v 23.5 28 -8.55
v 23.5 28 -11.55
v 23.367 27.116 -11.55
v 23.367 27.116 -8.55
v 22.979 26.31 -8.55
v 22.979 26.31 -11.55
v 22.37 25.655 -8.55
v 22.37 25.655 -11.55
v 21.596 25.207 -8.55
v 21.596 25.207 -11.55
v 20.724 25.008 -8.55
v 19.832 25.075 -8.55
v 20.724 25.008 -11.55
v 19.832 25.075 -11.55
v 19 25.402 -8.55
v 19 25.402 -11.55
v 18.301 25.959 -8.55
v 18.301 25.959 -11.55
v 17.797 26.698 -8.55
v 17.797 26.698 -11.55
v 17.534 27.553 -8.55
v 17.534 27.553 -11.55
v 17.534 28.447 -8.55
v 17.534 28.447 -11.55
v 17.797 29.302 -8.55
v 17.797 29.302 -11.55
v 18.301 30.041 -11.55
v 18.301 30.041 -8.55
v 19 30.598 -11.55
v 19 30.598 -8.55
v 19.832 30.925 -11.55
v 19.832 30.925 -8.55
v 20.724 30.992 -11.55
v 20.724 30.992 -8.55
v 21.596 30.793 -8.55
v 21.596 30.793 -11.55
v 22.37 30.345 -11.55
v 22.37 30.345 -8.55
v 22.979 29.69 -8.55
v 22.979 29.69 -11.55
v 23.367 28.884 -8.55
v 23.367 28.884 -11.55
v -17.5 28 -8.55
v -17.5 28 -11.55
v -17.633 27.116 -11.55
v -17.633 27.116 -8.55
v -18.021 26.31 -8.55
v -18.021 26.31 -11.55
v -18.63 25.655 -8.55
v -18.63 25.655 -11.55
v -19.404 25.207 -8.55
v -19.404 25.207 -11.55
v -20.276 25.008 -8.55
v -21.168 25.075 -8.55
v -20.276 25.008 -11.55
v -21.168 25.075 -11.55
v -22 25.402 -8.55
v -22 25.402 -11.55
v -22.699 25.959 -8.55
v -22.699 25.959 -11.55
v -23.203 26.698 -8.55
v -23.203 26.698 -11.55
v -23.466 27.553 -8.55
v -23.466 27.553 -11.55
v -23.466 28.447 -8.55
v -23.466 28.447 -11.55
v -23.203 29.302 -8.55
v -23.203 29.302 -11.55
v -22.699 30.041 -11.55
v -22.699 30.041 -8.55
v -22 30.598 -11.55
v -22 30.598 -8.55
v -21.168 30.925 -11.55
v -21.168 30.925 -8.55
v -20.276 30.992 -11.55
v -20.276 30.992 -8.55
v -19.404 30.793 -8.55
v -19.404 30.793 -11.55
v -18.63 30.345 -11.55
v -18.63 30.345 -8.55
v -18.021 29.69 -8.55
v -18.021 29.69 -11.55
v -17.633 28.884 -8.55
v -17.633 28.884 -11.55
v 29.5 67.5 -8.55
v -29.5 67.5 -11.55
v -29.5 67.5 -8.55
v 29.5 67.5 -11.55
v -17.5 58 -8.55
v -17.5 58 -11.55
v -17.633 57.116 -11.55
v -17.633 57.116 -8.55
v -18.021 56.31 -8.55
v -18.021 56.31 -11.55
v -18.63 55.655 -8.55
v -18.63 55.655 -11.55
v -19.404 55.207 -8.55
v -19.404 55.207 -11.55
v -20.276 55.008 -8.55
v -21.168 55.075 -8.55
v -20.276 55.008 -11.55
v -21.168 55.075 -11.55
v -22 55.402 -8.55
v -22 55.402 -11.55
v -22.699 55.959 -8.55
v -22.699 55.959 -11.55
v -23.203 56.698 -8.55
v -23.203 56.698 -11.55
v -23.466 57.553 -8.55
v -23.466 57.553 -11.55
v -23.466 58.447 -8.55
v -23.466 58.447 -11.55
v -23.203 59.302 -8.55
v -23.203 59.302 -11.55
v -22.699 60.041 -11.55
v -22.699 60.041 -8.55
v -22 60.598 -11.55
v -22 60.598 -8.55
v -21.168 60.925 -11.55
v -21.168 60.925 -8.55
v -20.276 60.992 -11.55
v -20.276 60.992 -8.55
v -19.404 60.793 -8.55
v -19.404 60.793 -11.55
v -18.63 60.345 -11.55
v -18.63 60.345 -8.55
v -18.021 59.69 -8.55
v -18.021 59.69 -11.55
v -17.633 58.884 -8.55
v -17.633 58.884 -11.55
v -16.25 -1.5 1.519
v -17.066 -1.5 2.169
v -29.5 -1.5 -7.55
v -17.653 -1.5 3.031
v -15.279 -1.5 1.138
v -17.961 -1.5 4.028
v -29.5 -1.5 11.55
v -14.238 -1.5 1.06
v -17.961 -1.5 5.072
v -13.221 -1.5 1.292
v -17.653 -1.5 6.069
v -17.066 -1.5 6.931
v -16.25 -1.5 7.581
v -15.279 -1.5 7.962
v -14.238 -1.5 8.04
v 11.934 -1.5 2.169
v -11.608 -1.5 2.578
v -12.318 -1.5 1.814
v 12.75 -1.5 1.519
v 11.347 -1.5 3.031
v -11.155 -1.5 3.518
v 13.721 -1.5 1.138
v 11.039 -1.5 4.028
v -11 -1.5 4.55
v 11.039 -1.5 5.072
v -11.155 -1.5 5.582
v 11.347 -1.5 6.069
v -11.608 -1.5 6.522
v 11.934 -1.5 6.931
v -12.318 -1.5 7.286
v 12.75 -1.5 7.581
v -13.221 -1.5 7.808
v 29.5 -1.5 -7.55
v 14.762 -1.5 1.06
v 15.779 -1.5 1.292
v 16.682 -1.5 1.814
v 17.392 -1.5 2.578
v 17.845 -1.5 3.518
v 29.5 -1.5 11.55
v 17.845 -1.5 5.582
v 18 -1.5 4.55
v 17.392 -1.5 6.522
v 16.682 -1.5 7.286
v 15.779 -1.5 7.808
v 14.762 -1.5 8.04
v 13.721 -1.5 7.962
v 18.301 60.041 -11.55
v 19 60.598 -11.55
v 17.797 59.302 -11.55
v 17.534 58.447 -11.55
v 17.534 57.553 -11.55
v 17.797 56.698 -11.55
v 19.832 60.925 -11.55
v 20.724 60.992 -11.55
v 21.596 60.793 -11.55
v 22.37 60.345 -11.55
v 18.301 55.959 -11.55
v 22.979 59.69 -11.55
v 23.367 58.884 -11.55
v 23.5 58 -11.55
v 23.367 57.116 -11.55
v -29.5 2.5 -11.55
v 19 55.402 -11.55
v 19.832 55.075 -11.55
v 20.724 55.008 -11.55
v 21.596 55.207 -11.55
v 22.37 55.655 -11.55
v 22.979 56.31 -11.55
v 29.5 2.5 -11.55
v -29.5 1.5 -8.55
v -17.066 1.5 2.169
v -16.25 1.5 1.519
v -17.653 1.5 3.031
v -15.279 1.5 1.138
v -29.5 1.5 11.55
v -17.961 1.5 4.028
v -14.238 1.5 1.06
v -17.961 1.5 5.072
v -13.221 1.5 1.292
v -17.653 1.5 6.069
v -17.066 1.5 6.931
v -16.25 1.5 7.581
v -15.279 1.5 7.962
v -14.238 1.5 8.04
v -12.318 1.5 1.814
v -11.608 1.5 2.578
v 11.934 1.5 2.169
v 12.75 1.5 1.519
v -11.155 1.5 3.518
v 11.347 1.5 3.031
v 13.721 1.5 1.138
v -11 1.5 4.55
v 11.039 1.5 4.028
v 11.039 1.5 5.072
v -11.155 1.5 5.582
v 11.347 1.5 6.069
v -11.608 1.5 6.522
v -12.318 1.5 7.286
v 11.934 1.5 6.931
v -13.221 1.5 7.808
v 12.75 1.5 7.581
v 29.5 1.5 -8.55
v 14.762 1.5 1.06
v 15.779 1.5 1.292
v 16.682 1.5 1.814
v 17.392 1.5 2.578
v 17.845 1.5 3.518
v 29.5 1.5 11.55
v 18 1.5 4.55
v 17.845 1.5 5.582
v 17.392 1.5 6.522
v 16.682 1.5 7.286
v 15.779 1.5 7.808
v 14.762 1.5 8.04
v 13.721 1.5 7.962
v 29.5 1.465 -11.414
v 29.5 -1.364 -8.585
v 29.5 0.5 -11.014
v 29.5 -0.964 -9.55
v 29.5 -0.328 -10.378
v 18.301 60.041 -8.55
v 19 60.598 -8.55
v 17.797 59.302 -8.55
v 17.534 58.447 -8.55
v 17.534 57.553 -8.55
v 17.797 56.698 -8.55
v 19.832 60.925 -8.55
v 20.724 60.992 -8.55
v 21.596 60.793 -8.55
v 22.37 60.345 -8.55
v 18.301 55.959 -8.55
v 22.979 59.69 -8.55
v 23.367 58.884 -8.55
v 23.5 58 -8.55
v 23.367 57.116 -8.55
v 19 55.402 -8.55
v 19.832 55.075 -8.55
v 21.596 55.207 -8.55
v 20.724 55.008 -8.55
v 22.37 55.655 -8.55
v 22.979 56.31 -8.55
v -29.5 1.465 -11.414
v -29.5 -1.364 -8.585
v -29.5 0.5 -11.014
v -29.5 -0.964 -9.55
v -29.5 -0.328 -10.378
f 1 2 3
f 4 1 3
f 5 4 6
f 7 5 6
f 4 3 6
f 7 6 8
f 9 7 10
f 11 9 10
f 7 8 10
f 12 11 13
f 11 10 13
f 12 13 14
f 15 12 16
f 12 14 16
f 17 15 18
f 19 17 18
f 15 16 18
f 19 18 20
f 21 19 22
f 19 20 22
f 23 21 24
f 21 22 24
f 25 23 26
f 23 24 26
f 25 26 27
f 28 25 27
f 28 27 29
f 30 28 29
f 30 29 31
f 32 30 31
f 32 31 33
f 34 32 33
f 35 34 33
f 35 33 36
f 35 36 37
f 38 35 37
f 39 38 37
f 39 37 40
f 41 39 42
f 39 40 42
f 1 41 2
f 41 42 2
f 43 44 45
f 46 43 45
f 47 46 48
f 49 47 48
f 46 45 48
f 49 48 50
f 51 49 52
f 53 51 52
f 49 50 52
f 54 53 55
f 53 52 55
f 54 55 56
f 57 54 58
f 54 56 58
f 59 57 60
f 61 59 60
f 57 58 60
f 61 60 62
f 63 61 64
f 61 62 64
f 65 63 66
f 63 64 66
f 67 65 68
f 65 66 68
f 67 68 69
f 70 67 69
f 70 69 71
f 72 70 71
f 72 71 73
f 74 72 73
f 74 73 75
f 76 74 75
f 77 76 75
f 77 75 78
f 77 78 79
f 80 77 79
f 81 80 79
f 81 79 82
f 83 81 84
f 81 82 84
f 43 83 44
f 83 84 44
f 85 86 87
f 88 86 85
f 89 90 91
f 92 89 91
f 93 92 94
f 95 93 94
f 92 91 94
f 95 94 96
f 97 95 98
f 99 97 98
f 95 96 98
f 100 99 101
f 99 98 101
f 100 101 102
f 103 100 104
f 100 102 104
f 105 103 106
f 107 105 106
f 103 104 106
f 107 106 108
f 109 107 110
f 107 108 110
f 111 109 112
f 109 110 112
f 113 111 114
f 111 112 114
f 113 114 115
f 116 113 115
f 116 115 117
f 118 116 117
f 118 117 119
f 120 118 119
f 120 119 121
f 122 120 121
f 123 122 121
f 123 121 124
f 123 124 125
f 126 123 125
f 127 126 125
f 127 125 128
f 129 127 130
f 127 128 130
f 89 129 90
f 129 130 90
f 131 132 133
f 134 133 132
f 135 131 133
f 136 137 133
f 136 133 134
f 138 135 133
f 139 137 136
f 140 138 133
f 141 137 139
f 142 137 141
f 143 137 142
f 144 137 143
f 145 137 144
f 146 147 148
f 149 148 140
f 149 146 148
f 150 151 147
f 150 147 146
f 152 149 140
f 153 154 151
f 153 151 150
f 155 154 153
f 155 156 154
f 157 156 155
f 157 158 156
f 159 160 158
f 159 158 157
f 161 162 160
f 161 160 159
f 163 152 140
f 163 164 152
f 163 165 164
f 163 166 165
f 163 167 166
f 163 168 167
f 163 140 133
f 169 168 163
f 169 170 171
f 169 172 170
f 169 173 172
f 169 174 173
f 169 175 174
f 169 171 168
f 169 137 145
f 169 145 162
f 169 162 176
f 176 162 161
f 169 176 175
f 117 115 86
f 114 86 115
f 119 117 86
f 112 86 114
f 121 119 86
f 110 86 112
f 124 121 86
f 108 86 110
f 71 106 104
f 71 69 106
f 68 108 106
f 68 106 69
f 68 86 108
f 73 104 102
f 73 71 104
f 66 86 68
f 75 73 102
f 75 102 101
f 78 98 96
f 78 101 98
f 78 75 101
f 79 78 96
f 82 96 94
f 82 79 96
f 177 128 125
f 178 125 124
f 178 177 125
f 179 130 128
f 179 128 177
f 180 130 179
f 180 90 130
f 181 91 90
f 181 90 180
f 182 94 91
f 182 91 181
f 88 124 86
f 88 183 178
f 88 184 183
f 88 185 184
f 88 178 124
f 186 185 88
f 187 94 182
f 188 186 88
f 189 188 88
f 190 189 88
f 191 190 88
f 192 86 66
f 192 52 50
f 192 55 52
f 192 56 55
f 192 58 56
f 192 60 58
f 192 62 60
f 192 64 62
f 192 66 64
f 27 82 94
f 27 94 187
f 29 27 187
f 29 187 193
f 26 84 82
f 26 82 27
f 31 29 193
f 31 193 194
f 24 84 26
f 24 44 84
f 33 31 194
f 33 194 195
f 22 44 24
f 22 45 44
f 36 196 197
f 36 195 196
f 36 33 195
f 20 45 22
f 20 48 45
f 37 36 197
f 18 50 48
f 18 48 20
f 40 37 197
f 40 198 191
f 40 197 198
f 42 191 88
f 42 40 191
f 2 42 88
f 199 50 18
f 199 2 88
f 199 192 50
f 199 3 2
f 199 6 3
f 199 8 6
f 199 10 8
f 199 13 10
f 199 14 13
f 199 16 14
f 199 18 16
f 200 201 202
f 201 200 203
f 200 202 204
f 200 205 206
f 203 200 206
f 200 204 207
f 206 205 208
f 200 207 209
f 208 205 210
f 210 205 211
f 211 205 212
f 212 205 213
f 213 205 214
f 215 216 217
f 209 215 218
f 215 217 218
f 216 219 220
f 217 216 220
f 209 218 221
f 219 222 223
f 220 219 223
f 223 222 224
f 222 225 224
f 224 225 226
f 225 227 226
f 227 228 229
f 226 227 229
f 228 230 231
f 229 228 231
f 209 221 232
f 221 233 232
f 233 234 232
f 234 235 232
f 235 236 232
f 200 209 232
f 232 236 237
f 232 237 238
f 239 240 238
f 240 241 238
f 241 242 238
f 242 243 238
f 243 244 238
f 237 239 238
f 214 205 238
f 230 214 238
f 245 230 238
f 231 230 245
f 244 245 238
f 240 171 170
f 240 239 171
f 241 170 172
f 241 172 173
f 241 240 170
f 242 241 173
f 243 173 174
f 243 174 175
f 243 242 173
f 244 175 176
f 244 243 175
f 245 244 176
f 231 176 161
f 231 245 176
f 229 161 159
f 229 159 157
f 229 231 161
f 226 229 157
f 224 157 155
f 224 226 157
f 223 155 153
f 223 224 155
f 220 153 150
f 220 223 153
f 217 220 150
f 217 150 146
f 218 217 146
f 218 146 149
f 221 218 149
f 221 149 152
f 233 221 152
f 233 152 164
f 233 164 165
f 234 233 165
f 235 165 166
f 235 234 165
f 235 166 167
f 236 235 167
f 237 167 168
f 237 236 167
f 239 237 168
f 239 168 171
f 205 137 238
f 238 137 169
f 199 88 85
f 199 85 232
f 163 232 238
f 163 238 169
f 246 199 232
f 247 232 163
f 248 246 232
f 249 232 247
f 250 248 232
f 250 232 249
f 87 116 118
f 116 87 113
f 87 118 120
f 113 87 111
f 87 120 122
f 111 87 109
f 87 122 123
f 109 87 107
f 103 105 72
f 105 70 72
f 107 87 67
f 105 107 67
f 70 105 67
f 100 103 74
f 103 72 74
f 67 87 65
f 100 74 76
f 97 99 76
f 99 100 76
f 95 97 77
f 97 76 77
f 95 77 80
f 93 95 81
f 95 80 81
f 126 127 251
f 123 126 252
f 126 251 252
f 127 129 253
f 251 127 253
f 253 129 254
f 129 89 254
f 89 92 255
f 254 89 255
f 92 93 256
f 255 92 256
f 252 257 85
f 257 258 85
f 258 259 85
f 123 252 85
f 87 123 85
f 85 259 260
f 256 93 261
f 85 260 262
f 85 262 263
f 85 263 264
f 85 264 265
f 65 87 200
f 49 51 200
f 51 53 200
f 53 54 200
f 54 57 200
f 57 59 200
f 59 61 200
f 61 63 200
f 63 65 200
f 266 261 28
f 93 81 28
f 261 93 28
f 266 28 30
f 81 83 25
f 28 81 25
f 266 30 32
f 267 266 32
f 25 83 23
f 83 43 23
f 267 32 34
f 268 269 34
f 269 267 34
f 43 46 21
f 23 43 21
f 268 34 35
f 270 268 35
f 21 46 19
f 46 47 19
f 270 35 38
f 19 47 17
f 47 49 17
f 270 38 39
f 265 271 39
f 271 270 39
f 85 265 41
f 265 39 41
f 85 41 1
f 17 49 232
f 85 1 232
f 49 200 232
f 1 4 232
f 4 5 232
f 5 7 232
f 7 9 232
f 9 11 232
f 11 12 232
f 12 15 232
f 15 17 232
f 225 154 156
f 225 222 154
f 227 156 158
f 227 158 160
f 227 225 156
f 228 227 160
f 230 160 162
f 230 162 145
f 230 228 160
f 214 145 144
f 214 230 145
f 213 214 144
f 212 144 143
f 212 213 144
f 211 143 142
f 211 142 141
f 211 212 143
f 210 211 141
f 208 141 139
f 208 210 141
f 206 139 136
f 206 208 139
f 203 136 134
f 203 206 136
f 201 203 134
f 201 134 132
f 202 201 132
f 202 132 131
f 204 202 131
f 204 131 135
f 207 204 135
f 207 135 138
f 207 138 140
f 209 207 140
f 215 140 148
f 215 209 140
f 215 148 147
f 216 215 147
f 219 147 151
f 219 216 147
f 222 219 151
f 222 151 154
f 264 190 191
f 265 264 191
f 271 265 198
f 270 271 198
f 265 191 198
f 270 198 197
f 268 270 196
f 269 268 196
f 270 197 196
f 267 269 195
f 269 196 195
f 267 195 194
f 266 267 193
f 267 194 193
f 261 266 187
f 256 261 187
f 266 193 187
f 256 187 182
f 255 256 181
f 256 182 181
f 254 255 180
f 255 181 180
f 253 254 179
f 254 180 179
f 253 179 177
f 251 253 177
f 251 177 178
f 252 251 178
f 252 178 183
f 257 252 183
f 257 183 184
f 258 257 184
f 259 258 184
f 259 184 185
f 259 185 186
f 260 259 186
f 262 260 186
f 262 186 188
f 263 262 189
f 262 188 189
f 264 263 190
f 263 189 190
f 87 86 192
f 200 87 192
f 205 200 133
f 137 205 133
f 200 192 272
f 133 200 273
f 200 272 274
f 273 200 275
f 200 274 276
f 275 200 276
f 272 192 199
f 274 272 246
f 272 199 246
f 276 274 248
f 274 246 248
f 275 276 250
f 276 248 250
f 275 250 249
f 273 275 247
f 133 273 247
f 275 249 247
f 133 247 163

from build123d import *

# Parameters (mm, degrees)
F0_W     = 59
F0_H     = 23.1
F0_R     = 3.5
F1_DEPTH = 1.5
F3_W     = 59
F3_H     = 66
F3_R     = 3
F4_DEPTH = 3
F5_R     = 4


with BuildPart() as f1:
    # F0 (on Front) → F1 (new body, symmetric)
    with BuildSketch(Plane.XZ):
        Rectangle(F0_W, F0_H)
        with Locations((-14.5, 4.55)):
            Circle(F0_R, mode=Mode.SUBTRACT)
        with Locations((14.5, 4.55)):
            Circle(F0_R, mode=Mode.SUBTRACT)
    extrude(amount=F1_DEPTH, both=True)

    # F3 (on offset) → F4 (join)
    with BuildSketch(Plane(origin=(0, 0, -11.55), x_dir=(1, 0, 0), z_dir=(0, 0, -1))):
        with Locations((0, -34.5)):
            Rectangle(F3_W, F3_H)
        with Locations((-20.5, -58)):
            Circle(F3_R, mode=Mode.SUBTRACT)
        with Locations((20.5, -58)):
            Circle(F3_R, mode=Mode.SUBTRACT)
        with Locations((-20.5, -28)):
            Circle(F3_R, mode=Mode.SUBTRACT)
        with Locations((20.5, -28)):
            Circle(F3_R, mode=Mode.SUBTRACT)
    extrude(amount=-F4_DEPTH)

    # F5
    f5_edges = [f1.edges().sort_by_distance(p)[0] for p in [
        (0, -1.5, -11.55),
    ]]
    fillet(f5_edges, radius=F5_R)


solid = f1.part
